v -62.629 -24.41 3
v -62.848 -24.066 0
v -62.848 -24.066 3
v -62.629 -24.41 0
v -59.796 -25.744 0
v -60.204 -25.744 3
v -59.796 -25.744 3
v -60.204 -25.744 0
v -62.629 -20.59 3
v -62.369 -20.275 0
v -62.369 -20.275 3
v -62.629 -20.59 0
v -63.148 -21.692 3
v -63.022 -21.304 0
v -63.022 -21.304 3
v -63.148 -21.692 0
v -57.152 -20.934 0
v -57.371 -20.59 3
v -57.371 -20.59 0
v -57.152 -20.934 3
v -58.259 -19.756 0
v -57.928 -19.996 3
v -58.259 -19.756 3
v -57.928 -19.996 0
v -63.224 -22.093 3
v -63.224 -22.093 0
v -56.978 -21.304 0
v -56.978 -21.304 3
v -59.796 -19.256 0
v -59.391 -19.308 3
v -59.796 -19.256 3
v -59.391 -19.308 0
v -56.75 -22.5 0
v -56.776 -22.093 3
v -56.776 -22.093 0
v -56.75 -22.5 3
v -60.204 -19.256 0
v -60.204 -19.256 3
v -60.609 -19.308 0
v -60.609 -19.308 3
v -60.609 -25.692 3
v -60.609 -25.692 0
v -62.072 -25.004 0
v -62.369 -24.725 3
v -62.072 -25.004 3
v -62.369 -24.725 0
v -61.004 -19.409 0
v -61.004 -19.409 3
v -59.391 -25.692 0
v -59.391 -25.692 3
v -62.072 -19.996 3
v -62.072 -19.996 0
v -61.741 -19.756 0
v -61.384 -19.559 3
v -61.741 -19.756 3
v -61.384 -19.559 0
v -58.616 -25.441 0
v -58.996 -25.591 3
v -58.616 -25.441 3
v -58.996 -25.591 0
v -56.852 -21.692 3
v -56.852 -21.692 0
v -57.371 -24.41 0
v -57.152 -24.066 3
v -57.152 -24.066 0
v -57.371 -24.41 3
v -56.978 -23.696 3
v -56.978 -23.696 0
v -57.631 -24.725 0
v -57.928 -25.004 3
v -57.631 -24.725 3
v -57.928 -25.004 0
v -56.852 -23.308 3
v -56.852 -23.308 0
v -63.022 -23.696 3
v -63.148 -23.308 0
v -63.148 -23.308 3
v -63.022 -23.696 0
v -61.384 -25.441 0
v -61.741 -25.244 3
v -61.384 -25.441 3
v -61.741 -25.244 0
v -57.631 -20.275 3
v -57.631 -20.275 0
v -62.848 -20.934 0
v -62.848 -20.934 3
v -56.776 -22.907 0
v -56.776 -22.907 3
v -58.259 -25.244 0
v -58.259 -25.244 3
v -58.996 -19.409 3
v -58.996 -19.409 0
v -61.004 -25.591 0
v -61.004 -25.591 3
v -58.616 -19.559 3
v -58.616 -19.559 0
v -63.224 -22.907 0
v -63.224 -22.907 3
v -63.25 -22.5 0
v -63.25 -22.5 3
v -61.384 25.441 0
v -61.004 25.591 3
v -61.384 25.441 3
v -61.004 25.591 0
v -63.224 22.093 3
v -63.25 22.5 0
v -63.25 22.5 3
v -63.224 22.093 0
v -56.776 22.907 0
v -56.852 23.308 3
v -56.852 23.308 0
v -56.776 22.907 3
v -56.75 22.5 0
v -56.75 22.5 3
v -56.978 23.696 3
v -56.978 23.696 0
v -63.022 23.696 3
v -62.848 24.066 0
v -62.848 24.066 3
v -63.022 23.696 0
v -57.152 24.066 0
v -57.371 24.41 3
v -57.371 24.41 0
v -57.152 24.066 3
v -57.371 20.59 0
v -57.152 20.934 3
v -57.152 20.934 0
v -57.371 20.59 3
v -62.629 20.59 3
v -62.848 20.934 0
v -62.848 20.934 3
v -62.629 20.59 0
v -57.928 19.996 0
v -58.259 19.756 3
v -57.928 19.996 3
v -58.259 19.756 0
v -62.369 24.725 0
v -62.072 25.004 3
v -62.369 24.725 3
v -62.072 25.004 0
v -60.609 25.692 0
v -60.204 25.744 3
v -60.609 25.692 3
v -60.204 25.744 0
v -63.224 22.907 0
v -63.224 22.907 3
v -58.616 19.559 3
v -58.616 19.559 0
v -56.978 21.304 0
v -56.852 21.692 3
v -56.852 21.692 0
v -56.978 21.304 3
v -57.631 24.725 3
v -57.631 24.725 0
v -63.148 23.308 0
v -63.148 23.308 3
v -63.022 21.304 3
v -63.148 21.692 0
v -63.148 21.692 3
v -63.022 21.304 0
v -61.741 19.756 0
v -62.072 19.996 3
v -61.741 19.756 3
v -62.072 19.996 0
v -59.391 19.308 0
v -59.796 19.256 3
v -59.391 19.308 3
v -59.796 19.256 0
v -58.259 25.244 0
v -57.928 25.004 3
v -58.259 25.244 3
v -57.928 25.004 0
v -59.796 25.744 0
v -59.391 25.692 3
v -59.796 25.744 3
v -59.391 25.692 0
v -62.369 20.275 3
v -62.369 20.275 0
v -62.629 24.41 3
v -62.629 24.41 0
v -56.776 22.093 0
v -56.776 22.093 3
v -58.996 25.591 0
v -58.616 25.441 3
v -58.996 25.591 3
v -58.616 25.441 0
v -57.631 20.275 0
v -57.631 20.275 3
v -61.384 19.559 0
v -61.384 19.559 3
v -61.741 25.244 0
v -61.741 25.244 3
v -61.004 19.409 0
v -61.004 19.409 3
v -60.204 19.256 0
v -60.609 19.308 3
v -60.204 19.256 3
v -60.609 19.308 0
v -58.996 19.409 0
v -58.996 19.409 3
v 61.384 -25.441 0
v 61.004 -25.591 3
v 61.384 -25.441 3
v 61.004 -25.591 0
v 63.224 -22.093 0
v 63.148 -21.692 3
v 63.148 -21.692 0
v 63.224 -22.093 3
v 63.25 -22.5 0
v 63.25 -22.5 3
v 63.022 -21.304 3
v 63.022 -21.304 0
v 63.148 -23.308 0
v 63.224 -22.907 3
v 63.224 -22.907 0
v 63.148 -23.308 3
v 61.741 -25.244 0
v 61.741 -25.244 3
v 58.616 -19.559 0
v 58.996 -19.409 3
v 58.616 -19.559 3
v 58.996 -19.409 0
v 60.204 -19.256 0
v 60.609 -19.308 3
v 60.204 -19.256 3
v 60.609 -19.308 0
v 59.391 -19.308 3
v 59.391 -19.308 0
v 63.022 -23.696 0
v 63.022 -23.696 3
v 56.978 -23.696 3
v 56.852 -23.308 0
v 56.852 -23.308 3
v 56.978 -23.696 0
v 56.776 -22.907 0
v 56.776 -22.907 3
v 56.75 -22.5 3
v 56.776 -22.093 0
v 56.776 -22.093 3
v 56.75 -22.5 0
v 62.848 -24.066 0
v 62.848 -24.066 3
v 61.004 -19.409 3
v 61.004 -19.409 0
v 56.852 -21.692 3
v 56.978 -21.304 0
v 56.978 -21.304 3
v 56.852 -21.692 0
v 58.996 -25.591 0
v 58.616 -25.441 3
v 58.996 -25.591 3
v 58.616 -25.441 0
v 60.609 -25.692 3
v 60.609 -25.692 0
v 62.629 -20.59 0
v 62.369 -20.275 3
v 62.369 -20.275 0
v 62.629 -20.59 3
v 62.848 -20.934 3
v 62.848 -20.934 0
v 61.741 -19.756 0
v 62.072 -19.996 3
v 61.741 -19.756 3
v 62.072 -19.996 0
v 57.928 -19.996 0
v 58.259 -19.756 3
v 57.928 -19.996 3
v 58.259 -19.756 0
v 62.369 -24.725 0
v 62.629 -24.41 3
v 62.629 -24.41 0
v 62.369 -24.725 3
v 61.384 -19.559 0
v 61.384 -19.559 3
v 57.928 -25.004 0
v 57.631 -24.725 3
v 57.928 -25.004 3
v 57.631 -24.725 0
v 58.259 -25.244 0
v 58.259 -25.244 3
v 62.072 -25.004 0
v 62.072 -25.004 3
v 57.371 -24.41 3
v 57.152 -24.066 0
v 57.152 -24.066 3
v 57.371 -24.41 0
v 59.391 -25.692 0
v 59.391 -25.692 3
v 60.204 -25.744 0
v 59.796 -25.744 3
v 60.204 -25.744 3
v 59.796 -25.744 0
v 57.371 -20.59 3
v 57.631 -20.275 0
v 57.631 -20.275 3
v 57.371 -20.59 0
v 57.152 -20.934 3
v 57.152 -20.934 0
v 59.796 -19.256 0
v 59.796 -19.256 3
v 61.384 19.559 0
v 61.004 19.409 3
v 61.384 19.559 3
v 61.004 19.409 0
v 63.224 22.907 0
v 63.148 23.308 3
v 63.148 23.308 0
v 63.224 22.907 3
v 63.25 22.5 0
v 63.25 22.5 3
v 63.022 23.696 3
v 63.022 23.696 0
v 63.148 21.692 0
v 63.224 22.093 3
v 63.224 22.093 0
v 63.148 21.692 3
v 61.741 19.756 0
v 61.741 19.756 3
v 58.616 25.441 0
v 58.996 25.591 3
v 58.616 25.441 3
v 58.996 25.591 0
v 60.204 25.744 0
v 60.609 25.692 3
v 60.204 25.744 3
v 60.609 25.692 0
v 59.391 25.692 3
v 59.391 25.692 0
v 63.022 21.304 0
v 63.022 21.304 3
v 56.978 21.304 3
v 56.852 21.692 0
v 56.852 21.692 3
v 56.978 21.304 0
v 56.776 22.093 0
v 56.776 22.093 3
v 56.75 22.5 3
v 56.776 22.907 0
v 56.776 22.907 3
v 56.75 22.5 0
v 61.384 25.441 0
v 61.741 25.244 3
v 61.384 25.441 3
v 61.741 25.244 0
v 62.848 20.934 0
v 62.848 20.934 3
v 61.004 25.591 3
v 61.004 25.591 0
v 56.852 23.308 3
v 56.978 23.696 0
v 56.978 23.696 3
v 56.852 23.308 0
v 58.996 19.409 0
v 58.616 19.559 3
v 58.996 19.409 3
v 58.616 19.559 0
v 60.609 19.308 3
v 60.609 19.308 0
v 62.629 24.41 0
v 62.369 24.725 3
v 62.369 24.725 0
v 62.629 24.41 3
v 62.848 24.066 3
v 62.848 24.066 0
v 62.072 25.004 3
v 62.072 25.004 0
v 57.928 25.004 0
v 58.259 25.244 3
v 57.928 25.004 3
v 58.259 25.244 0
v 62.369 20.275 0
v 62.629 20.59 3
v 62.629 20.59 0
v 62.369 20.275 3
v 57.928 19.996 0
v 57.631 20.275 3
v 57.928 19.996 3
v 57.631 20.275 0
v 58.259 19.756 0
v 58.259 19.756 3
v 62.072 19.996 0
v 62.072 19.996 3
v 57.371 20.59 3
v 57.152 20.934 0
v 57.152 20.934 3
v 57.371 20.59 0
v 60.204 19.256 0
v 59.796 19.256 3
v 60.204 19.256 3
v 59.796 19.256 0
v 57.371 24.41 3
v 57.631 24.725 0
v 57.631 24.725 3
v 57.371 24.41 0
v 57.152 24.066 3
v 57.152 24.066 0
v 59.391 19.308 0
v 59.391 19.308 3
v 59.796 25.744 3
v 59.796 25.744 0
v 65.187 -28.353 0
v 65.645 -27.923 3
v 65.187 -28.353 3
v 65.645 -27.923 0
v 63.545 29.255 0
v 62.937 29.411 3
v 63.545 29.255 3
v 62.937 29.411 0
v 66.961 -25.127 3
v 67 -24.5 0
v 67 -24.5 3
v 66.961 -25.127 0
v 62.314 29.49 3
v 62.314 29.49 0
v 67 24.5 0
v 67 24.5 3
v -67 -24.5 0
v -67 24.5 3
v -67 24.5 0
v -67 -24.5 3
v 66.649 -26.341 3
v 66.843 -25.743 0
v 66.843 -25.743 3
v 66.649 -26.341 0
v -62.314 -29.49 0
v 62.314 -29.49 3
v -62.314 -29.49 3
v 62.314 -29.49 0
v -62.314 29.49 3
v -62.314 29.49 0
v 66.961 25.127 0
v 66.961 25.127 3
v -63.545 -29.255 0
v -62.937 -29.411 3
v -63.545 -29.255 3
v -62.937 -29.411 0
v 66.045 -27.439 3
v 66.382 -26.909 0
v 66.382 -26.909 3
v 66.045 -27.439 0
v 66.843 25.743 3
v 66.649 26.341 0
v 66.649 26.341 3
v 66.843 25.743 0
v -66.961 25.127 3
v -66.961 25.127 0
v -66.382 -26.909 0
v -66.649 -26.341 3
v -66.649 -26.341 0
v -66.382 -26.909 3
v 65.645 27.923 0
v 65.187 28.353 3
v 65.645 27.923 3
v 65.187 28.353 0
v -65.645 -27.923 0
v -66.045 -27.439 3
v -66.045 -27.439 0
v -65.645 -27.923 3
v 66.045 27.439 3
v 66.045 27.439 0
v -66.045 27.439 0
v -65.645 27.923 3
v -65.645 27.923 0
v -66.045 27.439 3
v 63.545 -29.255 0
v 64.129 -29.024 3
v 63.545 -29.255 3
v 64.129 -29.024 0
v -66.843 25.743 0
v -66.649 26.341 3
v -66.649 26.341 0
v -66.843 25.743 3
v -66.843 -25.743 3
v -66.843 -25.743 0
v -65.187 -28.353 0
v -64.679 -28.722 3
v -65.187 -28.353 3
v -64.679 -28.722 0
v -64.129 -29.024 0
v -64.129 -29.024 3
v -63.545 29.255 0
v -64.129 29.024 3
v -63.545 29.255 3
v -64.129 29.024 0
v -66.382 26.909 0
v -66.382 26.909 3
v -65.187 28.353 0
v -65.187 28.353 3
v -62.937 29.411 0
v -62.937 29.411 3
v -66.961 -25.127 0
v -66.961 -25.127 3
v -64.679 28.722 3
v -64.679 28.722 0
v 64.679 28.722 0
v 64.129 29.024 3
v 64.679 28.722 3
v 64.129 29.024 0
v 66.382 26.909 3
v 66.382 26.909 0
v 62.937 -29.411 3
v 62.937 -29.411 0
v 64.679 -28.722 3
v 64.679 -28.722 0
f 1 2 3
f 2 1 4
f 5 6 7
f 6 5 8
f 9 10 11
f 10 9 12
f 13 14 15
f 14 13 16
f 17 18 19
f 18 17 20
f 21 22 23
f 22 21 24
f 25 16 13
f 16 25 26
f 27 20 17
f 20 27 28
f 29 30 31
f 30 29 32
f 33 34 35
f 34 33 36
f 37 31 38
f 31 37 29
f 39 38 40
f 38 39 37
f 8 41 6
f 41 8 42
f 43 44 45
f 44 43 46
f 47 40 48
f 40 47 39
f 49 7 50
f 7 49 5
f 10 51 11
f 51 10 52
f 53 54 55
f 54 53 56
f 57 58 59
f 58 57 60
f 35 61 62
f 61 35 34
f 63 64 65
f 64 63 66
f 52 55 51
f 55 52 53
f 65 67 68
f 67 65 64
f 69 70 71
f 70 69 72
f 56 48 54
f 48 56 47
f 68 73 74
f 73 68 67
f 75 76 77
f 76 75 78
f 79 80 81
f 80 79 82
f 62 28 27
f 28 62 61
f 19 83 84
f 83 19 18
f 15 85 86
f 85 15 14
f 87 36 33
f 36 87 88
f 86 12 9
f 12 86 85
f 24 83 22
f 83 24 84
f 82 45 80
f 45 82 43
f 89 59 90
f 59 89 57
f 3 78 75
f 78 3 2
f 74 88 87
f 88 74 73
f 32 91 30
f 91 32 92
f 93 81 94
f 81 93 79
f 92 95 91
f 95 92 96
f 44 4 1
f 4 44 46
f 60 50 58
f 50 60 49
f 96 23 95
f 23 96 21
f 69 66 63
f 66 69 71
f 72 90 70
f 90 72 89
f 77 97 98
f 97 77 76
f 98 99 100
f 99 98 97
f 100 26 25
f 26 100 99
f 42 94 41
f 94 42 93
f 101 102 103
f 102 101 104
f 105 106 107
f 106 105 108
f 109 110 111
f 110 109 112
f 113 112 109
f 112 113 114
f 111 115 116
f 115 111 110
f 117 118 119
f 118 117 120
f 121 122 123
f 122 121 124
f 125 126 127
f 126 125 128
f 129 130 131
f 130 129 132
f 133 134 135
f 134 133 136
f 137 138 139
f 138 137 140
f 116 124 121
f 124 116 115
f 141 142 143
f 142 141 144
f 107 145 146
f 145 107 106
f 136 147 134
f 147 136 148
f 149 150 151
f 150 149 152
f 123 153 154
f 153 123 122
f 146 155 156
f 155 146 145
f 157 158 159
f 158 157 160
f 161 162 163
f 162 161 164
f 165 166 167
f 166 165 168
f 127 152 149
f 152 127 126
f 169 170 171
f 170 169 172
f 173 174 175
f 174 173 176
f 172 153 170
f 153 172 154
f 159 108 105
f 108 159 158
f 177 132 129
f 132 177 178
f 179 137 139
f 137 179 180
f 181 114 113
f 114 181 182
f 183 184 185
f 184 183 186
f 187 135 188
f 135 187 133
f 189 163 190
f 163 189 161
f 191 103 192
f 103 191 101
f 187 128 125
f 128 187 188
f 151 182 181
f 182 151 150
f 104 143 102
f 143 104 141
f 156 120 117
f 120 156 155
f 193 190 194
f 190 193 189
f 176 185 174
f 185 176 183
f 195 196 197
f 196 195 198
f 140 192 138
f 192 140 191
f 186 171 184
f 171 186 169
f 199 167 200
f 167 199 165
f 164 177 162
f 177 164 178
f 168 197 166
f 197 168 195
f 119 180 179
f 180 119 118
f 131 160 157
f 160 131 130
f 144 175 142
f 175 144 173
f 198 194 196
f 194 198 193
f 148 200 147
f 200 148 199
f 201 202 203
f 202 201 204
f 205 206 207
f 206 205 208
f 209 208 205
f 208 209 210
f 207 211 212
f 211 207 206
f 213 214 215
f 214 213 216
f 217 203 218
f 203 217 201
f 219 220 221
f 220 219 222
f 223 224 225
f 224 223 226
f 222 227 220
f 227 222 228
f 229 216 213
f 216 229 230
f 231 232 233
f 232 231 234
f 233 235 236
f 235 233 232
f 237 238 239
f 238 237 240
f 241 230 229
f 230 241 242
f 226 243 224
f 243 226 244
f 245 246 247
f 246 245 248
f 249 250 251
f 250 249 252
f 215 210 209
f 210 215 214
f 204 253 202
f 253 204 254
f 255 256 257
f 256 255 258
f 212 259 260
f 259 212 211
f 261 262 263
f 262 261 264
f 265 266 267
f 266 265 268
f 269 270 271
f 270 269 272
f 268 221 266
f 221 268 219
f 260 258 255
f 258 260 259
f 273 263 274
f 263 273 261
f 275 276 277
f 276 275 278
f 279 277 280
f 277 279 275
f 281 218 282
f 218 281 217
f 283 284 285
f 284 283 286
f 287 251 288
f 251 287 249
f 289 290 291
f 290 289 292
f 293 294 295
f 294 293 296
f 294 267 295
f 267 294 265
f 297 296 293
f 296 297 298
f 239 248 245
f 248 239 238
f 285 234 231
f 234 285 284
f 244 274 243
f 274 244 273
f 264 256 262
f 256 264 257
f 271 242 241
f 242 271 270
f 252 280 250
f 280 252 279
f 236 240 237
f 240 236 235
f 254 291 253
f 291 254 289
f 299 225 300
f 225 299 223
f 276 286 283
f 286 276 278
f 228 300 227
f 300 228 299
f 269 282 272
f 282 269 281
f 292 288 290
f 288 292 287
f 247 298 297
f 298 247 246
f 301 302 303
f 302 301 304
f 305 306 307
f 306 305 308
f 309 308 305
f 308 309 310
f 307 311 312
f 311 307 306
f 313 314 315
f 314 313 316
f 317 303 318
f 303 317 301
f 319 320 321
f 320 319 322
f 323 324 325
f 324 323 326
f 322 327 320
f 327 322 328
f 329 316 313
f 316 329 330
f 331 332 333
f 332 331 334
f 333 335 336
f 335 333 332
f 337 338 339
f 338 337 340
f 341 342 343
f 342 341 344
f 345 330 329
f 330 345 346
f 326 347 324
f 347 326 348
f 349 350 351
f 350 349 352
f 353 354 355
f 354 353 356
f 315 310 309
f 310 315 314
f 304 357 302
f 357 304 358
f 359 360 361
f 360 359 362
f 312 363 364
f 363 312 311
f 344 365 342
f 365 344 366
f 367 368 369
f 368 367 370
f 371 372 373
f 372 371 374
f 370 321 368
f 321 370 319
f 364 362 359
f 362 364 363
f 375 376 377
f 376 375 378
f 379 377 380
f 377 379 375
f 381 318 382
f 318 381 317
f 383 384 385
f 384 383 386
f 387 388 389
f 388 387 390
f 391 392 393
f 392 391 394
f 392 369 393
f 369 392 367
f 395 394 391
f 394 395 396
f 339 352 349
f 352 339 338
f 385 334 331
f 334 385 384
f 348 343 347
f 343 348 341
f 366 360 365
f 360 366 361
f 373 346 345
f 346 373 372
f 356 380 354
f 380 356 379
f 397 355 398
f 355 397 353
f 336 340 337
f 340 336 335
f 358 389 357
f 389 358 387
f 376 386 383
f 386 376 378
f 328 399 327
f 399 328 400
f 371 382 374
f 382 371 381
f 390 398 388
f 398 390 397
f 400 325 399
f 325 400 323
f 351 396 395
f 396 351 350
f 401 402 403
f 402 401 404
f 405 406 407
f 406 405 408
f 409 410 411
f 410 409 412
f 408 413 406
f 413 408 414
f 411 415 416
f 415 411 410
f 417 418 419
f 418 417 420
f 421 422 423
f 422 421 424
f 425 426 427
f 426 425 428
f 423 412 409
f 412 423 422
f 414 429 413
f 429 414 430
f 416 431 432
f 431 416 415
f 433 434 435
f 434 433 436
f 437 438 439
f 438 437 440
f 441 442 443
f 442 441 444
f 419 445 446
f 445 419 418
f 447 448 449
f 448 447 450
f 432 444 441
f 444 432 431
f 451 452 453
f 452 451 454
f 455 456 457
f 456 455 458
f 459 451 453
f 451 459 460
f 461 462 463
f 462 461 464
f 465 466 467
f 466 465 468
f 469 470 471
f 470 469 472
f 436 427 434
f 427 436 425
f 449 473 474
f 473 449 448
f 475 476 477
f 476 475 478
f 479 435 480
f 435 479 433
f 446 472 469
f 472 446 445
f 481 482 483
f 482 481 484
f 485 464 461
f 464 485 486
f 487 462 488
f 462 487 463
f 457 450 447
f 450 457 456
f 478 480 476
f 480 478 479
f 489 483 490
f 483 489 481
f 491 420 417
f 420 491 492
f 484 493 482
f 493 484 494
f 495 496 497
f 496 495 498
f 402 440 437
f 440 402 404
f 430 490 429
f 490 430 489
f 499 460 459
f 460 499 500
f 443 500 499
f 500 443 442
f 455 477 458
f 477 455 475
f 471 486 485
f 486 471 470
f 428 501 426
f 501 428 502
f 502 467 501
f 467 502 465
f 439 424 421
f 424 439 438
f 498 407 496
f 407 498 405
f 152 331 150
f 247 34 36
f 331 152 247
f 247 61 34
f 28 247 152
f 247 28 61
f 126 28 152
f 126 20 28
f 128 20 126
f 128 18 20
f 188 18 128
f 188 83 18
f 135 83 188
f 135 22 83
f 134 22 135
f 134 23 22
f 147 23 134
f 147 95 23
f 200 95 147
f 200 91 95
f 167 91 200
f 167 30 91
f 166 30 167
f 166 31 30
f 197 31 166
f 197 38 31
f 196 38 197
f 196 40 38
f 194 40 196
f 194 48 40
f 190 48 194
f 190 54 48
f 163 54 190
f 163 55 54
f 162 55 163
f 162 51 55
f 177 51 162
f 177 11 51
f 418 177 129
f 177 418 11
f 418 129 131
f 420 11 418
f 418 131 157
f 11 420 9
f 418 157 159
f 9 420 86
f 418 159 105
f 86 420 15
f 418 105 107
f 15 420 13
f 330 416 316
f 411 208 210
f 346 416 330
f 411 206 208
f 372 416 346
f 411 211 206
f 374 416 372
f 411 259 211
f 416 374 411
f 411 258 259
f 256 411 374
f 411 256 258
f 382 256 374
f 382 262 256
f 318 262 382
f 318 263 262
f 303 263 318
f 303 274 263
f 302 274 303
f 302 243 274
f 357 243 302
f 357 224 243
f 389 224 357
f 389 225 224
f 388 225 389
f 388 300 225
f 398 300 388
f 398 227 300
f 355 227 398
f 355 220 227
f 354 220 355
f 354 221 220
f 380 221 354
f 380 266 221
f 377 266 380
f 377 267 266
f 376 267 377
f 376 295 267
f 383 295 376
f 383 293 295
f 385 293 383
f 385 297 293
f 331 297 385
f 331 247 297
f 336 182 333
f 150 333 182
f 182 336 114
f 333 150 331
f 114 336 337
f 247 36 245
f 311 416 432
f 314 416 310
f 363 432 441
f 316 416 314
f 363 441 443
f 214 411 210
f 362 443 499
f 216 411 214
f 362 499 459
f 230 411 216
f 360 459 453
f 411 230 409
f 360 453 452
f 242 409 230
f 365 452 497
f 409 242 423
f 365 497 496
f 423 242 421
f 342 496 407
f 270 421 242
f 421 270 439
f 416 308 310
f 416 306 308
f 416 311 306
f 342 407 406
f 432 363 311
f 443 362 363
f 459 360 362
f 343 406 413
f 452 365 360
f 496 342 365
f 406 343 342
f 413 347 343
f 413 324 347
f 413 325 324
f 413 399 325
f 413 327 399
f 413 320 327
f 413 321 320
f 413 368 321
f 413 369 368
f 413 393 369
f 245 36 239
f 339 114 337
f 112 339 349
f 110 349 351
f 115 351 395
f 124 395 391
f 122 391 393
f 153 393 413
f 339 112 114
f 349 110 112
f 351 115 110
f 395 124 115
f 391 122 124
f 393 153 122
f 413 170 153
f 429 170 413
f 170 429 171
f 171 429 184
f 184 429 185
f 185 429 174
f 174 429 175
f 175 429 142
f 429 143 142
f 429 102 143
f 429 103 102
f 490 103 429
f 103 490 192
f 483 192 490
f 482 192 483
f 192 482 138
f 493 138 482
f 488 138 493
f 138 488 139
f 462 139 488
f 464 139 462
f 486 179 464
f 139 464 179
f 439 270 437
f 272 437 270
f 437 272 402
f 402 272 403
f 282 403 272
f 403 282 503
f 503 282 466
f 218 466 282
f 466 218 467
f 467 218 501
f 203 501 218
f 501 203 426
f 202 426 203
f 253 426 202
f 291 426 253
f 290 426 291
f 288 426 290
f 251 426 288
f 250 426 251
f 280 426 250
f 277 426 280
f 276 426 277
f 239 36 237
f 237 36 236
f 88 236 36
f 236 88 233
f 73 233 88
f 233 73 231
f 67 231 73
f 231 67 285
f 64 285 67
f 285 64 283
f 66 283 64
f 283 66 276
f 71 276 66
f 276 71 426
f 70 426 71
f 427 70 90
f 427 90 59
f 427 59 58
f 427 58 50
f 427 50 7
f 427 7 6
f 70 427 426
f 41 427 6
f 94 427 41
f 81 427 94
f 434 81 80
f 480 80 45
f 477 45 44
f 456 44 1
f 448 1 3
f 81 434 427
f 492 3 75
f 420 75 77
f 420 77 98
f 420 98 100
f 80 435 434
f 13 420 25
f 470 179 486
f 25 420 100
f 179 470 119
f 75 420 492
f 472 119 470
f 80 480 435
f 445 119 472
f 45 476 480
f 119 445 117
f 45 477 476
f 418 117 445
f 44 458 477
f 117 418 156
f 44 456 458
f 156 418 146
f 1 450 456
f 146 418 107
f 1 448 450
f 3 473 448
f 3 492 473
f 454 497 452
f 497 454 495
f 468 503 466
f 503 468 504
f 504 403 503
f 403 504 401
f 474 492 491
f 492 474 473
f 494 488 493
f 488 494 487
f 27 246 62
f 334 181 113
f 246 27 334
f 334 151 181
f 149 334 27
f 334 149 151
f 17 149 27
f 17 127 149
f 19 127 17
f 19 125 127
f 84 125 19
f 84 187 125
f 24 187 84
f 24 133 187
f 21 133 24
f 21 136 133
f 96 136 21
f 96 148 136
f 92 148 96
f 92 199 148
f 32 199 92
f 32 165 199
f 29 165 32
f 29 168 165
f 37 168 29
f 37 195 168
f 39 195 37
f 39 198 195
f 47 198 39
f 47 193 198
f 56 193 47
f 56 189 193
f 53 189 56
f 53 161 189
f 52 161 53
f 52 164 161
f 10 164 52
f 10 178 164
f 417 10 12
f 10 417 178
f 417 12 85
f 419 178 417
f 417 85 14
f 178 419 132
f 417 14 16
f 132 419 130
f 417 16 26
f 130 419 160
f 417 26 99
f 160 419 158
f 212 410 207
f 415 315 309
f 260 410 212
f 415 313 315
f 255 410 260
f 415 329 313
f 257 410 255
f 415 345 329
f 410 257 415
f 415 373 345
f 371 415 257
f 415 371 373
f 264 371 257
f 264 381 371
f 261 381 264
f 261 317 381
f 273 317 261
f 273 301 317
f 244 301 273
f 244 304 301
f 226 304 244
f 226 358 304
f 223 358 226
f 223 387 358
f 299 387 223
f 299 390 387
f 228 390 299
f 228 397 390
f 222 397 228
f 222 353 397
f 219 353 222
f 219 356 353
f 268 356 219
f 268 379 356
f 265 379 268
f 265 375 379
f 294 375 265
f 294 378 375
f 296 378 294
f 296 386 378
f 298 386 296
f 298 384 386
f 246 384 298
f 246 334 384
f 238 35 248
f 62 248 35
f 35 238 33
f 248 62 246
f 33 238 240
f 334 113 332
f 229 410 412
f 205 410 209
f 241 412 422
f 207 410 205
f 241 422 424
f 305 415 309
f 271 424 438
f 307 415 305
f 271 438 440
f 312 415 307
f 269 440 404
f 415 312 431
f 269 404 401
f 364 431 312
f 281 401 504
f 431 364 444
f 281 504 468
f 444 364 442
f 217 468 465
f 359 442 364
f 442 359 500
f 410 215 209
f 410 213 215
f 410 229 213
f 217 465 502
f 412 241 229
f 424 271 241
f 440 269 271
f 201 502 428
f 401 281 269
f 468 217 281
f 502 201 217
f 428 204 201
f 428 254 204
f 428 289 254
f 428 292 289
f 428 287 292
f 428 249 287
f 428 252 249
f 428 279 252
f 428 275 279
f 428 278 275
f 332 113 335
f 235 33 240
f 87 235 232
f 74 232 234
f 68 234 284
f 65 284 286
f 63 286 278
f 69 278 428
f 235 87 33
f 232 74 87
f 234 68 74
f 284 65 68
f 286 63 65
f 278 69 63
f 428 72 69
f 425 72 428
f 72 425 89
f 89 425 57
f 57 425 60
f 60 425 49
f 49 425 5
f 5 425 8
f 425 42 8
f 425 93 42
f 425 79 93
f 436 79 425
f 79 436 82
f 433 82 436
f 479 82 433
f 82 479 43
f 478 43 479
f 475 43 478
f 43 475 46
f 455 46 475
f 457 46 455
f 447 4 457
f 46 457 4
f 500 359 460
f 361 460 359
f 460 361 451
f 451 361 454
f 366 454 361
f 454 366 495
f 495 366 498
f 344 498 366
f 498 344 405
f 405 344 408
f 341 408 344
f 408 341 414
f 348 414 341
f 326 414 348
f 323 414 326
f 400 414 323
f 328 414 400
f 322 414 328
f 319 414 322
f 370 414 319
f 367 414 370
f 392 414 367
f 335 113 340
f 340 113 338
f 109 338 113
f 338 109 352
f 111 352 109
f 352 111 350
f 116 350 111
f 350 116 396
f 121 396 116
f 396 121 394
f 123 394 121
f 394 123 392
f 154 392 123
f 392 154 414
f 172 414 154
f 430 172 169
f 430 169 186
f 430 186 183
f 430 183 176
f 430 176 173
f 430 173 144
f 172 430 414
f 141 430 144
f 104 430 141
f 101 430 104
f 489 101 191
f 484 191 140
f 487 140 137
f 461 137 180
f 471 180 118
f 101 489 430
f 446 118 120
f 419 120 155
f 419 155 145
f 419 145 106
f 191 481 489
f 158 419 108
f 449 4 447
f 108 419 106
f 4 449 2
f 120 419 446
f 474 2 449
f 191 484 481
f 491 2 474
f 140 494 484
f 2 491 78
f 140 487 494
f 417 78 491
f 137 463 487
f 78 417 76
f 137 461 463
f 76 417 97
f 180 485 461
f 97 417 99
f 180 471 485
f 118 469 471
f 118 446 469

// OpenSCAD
$fn = 50;


difference() {
	union() {
		hull() {
			translate(v = [-62.0000000000, 24.5000000000, 0]) {
				cylinder(h = 3, r = 5);
			}
			translate(v = [62.0000000000, 24.5000000000, 0]) {
				cylinder(h = 3, r = 5);
			}
			translate(v = [-62.0000000000, -24.5000000000, 0]) {
				cylinder(h = 3, r = 5);
			}
			translate(v = [62.0000000000, -24.5000000000, 0]) {
				cylinder(h = 3, r = 5);
			}
		}
	}
	union() {
		translate(v = [-60.0000000000, -22.5000000000, -100.0000000000]) {
			cylinder(h = 200, r = 3.2500000000);
		}
		translate(v = [-60.0000000000, 22.5000000000, -100.0000000000]) {
			cylinder(h = 200, r = 3.2500000000);
		}
		translate(v = [60.0000000000, -22.5000000000, -100.0000000000]) {
			cylinder(h = 200, r = 3.2500000000);
		}
		translate(v = [60.0000000000, 22.5000000000, -100.0000000000]) {
			cylinder(h = 200, r = 3.2500000000);
		}
	}
}
